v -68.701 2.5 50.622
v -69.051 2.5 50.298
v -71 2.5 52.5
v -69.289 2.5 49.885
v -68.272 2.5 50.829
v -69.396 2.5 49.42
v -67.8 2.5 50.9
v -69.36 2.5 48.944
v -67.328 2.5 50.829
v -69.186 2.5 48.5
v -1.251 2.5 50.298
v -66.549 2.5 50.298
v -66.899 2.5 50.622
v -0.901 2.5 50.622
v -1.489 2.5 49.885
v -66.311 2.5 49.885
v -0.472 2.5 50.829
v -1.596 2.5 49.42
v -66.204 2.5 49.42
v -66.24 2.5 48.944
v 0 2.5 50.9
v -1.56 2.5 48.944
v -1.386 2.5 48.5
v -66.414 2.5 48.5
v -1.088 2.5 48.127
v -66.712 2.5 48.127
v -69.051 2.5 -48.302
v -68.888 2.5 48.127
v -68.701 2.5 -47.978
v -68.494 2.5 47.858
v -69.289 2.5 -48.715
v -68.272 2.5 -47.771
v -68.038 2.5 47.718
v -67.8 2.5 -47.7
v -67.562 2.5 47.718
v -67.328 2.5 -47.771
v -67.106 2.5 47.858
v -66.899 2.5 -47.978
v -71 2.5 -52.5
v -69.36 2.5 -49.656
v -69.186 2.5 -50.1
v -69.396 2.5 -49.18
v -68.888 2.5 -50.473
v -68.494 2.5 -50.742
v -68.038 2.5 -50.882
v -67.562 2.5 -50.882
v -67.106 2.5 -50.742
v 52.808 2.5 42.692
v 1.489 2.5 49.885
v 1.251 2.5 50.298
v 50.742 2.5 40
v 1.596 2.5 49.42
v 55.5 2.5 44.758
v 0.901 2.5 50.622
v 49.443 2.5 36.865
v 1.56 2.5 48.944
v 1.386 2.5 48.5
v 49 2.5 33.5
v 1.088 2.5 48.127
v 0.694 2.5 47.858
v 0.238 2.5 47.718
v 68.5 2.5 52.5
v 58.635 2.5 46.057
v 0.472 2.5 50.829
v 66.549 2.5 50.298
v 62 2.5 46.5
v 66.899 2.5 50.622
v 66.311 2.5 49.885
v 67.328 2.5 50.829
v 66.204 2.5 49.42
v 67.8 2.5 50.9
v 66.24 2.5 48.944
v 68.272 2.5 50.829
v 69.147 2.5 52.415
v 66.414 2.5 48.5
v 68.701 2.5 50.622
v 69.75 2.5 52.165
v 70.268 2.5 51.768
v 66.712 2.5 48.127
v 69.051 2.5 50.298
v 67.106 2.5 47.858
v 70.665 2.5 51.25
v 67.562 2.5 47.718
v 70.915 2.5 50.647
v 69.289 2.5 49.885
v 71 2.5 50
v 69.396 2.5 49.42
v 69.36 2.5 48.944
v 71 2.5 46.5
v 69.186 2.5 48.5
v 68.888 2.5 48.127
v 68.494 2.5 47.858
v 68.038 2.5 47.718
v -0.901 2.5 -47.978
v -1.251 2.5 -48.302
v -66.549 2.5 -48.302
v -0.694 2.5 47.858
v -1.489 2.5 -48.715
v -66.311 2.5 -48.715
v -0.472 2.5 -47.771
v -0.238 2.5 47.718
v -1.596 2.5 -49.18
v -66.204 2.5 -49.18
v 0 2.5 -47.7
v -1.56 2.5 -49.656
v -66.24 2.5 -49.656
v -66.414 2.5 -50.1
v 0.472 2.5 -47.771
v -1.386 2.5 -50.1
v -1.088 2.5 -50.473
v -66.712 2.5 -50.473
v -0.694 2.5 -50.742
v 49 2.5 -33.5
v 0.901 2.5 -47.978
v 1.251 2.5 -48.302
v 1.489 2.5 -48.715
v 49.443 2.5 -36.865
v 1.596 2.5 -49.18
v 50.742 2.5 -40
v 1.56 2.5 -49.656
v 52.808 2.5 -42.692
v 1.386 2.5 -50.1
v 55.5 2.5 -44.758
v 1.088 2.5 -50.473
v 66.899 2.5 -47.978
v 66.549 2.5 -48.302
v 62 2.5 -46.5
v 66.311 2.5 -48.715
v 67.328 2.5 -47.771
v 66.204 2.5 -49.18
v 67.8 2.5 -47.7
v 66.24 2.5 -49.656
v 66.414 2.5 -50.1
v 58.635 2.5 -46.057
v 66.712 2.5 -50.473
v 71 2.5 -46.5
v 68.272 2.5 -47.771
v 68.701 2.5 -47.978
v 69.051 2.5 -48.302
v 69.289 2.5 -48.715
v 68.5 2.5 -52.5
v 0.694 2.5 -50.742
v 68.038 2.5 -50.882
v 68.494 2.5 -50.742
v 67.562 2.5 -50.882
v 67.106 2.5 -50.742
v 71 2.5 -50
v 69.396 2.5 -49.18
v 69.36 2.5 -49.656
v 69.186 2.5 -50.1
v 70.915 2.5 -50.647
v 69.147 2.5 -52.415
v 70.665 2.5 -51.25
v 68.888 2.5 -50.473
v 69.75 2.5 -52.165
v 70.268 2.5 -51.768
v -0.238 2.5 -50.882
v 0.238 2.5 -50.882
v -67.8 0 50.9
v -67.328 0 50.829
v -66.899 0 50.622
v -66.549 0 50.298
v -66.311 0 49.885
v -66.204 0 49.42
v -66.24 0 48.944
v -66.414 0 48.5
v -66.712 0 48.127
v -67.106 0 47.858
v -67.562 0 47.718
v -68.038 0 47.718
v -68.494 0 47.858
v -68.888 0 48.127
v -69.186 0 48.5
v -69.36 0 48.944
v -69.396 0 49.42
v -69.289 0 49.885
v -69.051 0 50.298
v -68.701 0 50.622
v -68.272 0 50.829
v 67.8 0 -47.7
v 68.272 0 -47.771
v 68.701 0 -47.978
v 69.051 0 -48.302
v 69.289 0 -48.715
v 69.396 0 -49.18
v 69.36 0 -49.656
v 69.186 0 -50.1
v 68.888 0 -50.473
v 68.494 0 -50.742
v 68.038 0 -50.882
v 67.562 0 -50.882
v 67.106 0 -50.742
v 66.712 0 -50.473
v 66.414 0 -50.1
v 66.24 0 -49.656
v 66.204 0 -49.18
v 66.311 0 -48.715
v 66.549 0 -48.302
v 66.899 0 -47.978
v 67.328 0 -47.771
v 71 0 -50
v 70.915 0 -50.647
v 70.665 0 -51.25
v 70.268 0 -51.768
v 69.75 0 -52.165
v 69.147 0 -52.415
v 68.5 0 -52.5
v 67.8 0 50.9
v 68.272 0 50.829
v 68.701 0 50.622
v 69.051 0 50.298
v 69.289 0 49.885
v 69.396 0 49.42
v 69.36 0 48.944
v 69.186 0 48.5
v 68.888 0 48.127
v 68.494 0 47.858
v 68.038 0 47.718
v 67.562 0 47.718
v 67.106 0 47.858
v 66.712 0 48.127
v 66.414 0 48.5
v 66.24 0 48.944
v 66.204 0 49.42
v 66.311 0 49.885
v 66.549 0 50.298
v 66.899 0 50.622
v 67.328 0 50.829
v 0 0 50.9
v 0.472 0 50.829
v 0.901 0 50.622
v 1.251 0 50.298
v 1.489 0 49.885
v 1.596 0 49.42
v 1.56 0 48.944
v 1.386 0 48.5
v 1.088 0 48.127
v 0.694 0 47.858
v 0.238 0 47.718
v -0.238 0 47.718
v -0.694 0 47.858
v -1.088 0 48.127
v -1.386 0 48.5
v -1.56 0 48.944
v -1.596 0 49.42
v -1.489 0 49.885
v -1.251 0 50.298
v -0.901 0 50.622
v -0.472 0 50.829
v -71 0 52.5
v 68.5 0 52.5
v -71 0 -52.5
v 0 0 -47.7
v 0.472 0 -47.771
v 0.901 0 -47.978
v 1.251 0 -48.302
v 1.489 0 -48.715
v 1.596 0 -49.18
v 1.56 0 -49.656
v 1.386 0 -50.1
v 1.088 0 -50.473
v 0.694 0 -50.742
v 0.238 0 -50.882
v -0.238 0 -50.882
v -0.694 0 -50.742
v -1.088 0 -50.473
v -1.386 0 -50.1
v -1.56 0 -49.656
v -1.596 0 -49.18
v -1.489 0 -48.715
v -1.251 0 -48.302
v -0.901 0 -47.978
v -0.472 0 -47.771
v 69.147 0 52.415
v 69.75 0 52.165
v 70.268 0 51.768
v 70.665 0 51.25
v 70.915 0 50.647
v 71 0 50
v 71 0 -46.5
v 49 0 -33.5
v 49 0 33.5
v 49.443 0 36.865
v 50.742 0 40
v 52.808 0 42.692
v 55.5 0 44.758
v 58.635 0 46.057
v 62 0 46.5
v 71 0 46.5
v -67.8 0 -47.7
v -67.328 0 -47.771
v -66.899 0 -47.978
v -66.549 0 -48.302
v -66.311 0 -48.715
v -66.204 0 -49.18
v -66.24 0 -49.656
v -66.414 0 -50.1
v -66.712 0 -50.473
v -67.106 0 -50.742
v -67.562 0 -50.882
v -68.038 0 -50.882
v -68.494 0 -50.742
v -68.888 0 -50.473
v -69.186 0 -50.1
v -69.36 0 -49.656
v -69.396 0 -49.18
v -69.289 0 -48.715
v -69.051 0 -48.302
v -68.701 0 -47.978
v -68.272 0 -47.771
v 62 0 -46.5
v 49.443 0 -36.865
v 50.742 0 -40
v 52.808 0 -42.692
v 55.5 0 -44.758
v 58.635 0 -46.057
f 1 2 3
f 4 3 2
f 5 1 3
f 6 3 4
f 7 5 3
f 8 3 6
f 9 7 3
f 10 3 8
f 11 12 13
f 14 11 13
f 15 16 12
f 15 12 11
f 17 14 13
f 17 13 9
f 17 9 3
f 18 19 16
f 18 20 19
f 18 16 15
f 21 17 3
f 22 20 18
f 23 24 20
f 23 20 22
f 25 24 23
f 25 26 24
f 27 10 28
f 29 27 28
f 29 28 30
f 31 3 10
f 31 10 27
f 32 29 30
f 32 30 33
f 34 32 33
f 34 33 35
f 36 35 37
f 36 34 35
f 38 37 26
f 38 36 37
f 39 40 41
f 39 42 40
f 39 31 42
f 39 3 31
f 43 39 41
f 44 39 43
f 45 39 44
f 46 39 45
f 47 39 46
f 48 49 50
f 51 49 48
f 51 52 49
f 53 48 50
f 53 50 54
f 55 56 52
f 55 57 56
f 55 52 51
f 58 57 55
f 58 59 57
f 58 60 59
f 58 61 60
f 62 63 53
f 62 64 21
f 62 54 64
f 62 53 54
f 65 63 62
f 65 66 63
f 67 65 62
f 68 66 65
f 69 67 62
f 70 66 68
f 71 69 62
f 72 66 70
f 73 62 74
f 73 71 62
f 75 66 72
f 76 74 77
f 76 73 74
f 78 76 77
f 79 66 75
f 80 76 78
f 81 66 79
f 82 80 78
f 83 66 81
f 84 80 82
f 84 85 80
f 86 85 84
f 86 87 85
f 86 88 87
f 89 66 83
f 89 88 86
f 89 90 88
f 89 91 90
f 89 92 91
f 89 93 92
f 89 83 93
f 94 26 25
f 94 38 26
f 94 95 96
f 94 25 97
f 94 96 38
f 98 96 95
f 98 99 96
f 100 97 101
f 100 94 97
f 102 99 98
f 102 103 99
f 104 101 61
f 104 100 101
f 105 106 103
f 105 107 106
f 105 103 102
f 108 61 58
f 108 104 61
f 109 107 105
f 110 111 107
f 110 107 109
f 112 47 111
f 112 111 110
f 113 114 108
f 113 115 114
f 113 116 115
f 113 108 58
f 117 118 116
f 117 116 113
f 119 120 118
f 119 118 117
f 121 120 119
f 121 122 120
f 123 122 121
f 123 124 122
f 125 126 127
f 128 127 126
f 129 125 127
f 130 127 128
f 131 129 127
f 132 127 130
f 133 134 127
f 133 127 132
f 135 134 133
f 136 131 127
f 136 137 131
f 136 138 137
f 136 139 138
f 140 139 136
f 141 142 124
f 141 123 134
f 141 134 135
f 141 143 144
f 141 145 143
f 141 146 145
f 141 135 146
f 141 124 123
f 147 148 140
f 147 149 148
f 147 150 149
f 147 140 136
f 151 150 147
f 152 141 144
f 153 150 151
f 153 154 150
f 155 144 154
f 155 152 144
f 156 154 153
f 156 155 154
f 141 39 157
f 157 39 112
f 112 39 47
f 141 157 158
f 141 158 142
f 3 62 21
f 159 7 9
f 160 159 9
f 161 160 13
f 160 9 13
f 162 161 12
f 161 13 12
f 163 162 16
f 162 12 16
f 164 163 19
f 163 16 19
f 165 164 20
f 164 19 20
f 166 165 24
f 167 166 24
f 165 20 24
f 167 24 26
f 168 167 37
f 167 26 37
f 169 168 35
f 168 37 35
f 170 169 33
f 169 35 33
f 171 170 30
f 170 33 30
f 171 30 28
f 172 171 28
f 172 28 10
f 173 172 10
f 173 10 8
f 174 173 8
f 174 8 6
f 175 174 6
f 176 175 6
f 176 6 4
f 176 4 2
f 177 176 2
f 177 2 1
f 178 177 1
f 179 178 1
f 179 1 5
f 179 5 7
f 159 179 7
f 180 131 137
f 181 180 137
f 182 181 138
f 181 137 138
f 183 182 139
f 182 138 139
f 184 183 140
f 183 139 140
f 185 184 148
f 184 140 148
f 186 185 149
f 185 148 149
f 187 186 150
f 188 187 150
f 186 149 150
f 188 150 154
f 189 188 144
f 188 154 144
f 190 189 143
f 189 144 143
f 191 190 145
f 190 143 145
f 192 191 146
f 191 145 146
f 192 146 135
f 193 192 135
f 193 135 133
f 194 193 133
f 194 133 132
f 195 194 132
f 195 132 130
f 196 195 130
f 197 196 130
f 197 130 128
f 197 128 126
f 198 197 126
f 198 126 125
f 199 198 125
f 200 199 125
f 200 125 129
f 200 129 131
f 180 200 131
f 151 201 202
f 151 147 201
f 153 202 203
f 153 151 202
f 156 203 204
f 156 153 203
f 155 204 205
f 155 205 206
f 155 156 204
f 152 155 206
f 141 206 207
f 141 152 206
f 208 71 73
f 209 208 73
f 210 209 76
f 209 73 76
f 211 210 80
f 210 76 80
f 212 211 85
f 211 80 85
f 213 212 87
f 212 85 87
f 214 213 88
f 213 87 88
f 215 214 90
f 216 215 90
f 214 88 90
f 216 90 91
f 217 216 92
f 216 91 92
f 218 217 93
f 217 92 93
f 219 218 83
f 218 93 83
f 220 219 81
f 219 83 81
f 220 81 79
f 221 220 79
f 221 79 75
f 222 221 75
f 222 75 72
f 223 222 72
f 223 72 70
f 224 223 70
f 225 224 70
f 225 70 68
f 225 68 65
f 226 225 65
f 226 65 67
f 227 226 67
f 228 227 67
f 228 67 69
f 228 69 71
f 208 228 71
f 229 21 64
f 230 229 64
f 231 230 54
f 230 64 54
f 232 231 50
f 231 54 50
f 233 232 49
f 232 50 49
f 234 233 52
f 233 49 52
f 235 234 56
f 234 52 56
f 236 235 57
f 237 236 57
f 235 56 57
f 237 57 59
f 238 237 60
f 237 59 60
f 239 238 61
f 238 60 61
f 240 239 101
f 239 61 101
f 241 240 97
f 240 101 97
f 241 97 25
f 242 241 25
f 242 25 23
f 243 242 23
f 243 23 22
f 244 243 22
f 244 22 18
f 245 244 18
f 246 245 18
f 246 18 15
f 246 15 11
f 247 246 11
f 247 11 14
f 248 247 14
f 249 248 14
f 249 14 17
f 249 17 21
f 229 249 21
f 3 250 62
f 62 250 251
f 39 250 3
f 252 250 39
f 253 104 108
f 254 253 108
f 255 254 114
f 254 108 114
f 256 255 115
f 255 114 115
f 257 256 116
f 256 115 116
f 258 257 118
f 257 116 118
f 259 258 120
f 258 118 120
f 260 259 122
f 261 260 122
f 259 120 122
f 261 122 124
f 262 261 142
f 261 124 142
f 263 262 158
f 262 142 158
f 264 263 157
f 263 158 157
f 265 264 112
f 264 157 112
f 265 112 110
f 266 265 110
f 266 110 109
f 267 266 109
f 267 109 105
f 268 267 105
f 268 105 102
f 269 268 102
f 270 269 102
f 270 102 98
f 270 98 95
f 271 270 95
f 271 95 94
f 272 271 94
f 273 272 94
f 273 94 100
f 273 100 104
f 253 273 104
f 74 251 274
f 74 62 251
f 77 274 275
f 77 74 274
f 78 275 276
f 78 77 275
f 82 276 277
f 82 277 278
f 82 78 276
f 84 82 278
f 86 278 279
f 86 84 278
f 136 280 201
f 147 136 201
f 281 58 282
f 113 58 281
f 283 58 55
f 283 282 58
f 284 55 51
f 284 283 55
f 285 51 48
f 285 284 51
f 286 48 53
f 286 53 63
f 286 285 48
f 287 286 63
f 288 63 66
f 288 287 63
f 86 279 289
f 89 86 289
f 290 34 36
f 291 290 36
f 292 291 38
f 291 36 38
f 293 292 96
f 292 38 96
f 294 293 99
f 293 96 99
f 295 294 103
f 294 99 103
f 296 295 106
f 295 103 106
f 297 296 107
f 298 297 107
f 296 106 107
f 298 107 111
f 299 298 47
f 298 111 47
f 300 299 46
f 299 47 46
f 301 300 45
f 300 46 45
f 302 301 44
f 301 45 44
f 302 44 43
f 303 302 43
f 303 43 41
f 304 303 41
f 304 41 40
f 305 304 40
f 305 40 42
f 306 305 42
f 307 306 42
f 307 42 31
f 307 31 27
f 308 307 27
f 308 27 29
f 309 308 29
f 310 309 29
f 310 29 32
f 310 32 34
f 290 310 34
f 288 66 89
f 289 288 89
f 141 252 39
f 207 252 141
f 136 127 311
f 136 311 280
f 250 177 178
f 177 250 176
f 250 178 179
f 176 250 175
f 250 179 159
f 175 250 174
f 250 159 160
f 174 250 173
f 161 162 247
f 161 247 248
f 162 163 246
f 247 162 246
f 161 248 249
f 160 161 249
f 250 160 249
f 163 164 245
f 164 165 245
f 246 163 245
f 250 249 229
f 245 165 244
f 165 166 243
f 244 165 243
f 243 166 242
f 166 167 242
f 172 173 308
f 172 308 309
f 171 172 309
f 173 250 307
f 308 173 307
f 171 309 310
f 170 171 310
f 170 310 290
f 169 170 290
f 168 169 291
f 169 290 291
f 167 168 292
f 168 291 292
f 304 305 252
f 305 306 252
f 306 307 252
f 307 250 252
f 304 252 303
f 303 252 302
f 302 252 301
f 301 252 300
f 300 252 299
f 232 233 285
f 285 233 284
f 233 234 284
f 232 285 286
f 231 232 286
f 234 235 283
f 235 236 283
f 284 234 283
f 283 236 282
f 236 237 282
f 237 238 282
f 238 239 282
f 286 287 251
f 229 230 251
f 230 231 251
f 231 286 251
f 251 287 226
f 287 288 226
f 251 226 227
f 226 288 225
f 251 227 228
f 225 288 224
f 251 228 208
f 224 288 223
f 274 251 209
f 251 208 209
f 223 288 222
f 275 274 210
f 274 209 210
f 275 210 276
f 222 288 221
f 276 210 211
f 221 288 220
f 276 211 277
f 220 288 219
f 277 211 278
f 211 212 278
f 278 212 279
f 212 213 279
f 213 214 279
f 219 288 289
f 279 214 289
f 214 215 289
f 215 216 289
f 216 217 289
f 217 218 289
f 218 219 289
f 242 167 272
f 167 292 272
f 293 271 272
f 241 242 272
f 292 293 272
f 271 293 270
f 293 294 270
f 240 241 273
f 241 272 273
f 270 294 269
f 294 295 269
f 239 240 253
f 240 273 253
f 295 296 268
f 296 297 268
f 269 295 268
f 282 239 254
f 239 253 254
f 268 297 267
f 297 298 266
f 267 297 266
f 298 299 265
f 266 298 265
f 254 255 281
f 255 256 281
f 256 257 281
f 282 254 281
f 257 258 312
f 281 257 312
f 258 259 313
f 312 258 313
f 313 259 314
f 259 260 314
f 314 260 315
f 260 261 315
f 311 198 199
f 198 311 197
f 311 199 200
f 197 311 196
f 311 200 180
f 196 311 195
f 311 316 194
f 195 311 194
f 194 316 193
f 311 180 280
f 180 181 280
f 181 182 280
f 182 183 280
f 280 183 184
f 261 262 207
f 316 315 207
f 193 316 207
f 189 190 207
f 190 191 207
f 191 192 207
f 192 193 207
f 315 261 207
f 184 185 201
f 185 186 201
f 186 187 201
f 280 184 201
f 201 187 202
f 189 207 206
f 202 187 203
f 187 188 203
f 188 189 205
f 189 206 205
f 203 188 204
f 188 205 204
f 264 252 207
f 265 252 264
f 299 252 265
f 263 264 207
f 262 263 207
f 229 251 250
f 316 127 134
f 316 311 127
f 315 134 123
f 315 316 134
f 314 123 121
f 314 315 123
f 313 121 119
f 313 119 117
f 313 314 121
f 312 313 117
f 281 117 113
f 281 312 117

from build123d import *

# Parameters (mm, degrees)
SKETCH1_W           = 142
SKETCH1_H           = 105
BOSS_EXTRUDE1_DEPTH = 2.5
CUT_EXTRUDE1_REACH  = 90.337
SKETCH2_R           = 1.6
SKETCH2_W           = 22
SKETCH2_H           = 93
FILLET1_R           = 13
FILLET2_R           = 2.5


with BuildPart() as part:
    # Sketch1 → Boss-Extrude1 (new body)
    with BuildSketch(Plane(origin=(0, 0, 0), x_dir=(1, 0, 0), z_dir=(0, 1, 0))):
        Rectangle(SKETCH1_W, SKETCH1_H)
    extrude(amount=BOSS_EXTRUDE1_DEPTH)

    # Sketch2 → Cut-Extrude1 (cut, up to next)
    with BuildSketch(Plane(origin=(0, 2.5, 0), x_dir=(1, 0, 0), z_dir=(0, 1, 0)), mode=Mode.PRIVATE) as cut_extrude1_sk1:
        with Locations(Location((-67.8, 49.3, 0), (0, 0, 270))):
            Circle(SKETCH2_R)
    cut_extrude1_tool1 = extrude(cut_extrude1_sk1.sketch, amount=-CUT_EXTRUDE1_REACH, mode=Mode.PRIVATE) & part.part
    # Sketch2 → Cut-Extrude1 (cut, up to next)
    with BuildSketch(Plane(origin=(0, 2.5, 0), x_dir=(1, 0, 0), z_dir=(0, 1, 0)), mode=Mode.PRIVATE) as cut_extrude1_sk2:
        with Locations(Location((0, 49.3, 0), (0, 0, 270))):
            Circle(SKETCH2_R)
    cut_extrude1_tool2 = extrude(cut_extrude1_sk2.sketch, amount=-CUT_EXTRUDE1_REACH, mode=Mode.PRIVATE) & part.part
    # Sketch2 → Cut-Extrude1 (cut, up to next)
    with BuildSketch(Plane(origin=(0, 2.5, 0), x_dir=(1, 0, 0), z_dir=(0, 1, 0)), mode=Mode.PRIVATE) as cut_extrude1_sk3:
        with Locations(Location((0, -49.3, 0), (0, 0, 270))):
            Circle(SKETCH2_R)
    cut_extrude1_tool3 = extrude(cut_extrude1_sk3.sketch, amount=-CUT_EXTRUDE1_REACH, mode=Mode.PRIVATE) & part.part
    # Sketch2 → Cut-Extrude1 (cut, up to next)
    with BuildSketch(Plane(origin=(0, 2.5, 0), x_dir=(1, 0, 0), z_dir=(0, 1, 0)), mode=Mode.PRIVATE) as cut_extrude1_sk4:
        with Locations(Location((-67.8, -49.3, 0), (0, 0, 270))):
            Circle(SKETCH2_R)
    cut_extrude1_tool4 = extrude(cut_extrude1_sk4.sketch, amount=-CUT_EXTRUDE1_REACH, mode=Mode.PRIVATE) & part.part
    # Sketch2 → Cut-Extrude1 (cut, up to next)
    with BuildSketch(Plane(origin=(0, 2.5, 0), x_dir=(1, 0, 0), z_dir=(0, 1, 0)), mode=Mode.PRIVATE) as cut_extrude1_sk5:
        with Locations(Location((67.8, 49.3, 0), (0, 0, 270))):
            Circle(SKETCH2_R)
    cut_extrude1_tool5 = extrude(cut_extrude1_sk5.sketch, amount=-CUT_EXTRUDE1_REACH, mode=Mode.PRIVATE) & part.part
    # Sketch2 → Cut-Extrude1 (cut, up to next)
    with BuildSketch(Plane(origin=(0, 2.5, 0), x_dir=(1, 0, 0), z_dir=(0, 1, 0)), mode=Mode.PRIVATE) as cut_extrude1_sk6:
        with Locations(Location((67.8, -49.3, 0), (0, 0, 270))):
            Circle(SKETCH2_R)
    cut_extrude1_tool6 = extrude(cut_extrude1_sk6.sketch, amount=-CUT_EXTRUDE1_REACH, mode=Mode.PRIVATE) & part.part
    # Sketch2 → Cut-Extrude1 (cut, up to next)
    with BuildSketch(Plane(origin=(0, 2.5, 0), x_dir=(1, 0, 0), z_dir=(0, 1, 0)), mode=Mode.PRIVATE) as cut_extrude1_sk7:
        with Locations((60, 0)):
            Rectangle(SKETCH2_W, SKETCH2_H)
    cut_extrude1_tool7 = extrude(cut_extrude1_sk7.sketch, amount=-CUT_EXTRUDE1_REACH, mode=Mode.PRIVATE) & part.part
    add(cut_extrude1_tool1.solids().sort_by_distance((-67.8, 2.5, -49.3))[0], mode=Mode.SUBTRACT)
    add(cut_extrude1_tool2.solids().sort_by_distance((0, 2.5, -49.3))[0], mode=Mode.SUBTRACT)
    add(cut_extrude1_tool3.solids().sort_by_distance((0, 2.5, 49.3))[0], mode=Mode.SUBTRACT)
    add(cut_extrude1_tool4.solids().sort_by_distance((-67.8, 2.5, 49.3))[0], mode=Mode.SUBTRACT)
    add(cut_extrude1_tool5.solids().sort_by_distance((67.8, 2.5, -49.3))[0], mode=Mode.SUBTRACT)
    add(cut_extrude1_tool6.solids().sort_by_distance((67.8, 2.5, 49.3))[0], mode=Mode.SUBTRACT)
    add(cut_extrude1_tool7.solids().sort_by_distance((60, 2.5, 0))[0], mode=Mode.SUBTRACT)

    # Fillet1
    fillet1_edges = [part.edges().sort_by_distance(p)[0] for p in [
        (49, 1.25, 46.5),
        (49, 1.25, -46.5),
    ]]
    fillet(fillet1_edges, radius=FILLET1_R)

    # Fillet2
    fillet2_edges = [part.edges().sort_by_distance(p)[0] for p in [
        (71, 1.25, 52.5),
        (71, 1.25, -52.5),
    ]]
    fillet(fillet2_edges, radius=FILLET2_R)


solid = part.part
